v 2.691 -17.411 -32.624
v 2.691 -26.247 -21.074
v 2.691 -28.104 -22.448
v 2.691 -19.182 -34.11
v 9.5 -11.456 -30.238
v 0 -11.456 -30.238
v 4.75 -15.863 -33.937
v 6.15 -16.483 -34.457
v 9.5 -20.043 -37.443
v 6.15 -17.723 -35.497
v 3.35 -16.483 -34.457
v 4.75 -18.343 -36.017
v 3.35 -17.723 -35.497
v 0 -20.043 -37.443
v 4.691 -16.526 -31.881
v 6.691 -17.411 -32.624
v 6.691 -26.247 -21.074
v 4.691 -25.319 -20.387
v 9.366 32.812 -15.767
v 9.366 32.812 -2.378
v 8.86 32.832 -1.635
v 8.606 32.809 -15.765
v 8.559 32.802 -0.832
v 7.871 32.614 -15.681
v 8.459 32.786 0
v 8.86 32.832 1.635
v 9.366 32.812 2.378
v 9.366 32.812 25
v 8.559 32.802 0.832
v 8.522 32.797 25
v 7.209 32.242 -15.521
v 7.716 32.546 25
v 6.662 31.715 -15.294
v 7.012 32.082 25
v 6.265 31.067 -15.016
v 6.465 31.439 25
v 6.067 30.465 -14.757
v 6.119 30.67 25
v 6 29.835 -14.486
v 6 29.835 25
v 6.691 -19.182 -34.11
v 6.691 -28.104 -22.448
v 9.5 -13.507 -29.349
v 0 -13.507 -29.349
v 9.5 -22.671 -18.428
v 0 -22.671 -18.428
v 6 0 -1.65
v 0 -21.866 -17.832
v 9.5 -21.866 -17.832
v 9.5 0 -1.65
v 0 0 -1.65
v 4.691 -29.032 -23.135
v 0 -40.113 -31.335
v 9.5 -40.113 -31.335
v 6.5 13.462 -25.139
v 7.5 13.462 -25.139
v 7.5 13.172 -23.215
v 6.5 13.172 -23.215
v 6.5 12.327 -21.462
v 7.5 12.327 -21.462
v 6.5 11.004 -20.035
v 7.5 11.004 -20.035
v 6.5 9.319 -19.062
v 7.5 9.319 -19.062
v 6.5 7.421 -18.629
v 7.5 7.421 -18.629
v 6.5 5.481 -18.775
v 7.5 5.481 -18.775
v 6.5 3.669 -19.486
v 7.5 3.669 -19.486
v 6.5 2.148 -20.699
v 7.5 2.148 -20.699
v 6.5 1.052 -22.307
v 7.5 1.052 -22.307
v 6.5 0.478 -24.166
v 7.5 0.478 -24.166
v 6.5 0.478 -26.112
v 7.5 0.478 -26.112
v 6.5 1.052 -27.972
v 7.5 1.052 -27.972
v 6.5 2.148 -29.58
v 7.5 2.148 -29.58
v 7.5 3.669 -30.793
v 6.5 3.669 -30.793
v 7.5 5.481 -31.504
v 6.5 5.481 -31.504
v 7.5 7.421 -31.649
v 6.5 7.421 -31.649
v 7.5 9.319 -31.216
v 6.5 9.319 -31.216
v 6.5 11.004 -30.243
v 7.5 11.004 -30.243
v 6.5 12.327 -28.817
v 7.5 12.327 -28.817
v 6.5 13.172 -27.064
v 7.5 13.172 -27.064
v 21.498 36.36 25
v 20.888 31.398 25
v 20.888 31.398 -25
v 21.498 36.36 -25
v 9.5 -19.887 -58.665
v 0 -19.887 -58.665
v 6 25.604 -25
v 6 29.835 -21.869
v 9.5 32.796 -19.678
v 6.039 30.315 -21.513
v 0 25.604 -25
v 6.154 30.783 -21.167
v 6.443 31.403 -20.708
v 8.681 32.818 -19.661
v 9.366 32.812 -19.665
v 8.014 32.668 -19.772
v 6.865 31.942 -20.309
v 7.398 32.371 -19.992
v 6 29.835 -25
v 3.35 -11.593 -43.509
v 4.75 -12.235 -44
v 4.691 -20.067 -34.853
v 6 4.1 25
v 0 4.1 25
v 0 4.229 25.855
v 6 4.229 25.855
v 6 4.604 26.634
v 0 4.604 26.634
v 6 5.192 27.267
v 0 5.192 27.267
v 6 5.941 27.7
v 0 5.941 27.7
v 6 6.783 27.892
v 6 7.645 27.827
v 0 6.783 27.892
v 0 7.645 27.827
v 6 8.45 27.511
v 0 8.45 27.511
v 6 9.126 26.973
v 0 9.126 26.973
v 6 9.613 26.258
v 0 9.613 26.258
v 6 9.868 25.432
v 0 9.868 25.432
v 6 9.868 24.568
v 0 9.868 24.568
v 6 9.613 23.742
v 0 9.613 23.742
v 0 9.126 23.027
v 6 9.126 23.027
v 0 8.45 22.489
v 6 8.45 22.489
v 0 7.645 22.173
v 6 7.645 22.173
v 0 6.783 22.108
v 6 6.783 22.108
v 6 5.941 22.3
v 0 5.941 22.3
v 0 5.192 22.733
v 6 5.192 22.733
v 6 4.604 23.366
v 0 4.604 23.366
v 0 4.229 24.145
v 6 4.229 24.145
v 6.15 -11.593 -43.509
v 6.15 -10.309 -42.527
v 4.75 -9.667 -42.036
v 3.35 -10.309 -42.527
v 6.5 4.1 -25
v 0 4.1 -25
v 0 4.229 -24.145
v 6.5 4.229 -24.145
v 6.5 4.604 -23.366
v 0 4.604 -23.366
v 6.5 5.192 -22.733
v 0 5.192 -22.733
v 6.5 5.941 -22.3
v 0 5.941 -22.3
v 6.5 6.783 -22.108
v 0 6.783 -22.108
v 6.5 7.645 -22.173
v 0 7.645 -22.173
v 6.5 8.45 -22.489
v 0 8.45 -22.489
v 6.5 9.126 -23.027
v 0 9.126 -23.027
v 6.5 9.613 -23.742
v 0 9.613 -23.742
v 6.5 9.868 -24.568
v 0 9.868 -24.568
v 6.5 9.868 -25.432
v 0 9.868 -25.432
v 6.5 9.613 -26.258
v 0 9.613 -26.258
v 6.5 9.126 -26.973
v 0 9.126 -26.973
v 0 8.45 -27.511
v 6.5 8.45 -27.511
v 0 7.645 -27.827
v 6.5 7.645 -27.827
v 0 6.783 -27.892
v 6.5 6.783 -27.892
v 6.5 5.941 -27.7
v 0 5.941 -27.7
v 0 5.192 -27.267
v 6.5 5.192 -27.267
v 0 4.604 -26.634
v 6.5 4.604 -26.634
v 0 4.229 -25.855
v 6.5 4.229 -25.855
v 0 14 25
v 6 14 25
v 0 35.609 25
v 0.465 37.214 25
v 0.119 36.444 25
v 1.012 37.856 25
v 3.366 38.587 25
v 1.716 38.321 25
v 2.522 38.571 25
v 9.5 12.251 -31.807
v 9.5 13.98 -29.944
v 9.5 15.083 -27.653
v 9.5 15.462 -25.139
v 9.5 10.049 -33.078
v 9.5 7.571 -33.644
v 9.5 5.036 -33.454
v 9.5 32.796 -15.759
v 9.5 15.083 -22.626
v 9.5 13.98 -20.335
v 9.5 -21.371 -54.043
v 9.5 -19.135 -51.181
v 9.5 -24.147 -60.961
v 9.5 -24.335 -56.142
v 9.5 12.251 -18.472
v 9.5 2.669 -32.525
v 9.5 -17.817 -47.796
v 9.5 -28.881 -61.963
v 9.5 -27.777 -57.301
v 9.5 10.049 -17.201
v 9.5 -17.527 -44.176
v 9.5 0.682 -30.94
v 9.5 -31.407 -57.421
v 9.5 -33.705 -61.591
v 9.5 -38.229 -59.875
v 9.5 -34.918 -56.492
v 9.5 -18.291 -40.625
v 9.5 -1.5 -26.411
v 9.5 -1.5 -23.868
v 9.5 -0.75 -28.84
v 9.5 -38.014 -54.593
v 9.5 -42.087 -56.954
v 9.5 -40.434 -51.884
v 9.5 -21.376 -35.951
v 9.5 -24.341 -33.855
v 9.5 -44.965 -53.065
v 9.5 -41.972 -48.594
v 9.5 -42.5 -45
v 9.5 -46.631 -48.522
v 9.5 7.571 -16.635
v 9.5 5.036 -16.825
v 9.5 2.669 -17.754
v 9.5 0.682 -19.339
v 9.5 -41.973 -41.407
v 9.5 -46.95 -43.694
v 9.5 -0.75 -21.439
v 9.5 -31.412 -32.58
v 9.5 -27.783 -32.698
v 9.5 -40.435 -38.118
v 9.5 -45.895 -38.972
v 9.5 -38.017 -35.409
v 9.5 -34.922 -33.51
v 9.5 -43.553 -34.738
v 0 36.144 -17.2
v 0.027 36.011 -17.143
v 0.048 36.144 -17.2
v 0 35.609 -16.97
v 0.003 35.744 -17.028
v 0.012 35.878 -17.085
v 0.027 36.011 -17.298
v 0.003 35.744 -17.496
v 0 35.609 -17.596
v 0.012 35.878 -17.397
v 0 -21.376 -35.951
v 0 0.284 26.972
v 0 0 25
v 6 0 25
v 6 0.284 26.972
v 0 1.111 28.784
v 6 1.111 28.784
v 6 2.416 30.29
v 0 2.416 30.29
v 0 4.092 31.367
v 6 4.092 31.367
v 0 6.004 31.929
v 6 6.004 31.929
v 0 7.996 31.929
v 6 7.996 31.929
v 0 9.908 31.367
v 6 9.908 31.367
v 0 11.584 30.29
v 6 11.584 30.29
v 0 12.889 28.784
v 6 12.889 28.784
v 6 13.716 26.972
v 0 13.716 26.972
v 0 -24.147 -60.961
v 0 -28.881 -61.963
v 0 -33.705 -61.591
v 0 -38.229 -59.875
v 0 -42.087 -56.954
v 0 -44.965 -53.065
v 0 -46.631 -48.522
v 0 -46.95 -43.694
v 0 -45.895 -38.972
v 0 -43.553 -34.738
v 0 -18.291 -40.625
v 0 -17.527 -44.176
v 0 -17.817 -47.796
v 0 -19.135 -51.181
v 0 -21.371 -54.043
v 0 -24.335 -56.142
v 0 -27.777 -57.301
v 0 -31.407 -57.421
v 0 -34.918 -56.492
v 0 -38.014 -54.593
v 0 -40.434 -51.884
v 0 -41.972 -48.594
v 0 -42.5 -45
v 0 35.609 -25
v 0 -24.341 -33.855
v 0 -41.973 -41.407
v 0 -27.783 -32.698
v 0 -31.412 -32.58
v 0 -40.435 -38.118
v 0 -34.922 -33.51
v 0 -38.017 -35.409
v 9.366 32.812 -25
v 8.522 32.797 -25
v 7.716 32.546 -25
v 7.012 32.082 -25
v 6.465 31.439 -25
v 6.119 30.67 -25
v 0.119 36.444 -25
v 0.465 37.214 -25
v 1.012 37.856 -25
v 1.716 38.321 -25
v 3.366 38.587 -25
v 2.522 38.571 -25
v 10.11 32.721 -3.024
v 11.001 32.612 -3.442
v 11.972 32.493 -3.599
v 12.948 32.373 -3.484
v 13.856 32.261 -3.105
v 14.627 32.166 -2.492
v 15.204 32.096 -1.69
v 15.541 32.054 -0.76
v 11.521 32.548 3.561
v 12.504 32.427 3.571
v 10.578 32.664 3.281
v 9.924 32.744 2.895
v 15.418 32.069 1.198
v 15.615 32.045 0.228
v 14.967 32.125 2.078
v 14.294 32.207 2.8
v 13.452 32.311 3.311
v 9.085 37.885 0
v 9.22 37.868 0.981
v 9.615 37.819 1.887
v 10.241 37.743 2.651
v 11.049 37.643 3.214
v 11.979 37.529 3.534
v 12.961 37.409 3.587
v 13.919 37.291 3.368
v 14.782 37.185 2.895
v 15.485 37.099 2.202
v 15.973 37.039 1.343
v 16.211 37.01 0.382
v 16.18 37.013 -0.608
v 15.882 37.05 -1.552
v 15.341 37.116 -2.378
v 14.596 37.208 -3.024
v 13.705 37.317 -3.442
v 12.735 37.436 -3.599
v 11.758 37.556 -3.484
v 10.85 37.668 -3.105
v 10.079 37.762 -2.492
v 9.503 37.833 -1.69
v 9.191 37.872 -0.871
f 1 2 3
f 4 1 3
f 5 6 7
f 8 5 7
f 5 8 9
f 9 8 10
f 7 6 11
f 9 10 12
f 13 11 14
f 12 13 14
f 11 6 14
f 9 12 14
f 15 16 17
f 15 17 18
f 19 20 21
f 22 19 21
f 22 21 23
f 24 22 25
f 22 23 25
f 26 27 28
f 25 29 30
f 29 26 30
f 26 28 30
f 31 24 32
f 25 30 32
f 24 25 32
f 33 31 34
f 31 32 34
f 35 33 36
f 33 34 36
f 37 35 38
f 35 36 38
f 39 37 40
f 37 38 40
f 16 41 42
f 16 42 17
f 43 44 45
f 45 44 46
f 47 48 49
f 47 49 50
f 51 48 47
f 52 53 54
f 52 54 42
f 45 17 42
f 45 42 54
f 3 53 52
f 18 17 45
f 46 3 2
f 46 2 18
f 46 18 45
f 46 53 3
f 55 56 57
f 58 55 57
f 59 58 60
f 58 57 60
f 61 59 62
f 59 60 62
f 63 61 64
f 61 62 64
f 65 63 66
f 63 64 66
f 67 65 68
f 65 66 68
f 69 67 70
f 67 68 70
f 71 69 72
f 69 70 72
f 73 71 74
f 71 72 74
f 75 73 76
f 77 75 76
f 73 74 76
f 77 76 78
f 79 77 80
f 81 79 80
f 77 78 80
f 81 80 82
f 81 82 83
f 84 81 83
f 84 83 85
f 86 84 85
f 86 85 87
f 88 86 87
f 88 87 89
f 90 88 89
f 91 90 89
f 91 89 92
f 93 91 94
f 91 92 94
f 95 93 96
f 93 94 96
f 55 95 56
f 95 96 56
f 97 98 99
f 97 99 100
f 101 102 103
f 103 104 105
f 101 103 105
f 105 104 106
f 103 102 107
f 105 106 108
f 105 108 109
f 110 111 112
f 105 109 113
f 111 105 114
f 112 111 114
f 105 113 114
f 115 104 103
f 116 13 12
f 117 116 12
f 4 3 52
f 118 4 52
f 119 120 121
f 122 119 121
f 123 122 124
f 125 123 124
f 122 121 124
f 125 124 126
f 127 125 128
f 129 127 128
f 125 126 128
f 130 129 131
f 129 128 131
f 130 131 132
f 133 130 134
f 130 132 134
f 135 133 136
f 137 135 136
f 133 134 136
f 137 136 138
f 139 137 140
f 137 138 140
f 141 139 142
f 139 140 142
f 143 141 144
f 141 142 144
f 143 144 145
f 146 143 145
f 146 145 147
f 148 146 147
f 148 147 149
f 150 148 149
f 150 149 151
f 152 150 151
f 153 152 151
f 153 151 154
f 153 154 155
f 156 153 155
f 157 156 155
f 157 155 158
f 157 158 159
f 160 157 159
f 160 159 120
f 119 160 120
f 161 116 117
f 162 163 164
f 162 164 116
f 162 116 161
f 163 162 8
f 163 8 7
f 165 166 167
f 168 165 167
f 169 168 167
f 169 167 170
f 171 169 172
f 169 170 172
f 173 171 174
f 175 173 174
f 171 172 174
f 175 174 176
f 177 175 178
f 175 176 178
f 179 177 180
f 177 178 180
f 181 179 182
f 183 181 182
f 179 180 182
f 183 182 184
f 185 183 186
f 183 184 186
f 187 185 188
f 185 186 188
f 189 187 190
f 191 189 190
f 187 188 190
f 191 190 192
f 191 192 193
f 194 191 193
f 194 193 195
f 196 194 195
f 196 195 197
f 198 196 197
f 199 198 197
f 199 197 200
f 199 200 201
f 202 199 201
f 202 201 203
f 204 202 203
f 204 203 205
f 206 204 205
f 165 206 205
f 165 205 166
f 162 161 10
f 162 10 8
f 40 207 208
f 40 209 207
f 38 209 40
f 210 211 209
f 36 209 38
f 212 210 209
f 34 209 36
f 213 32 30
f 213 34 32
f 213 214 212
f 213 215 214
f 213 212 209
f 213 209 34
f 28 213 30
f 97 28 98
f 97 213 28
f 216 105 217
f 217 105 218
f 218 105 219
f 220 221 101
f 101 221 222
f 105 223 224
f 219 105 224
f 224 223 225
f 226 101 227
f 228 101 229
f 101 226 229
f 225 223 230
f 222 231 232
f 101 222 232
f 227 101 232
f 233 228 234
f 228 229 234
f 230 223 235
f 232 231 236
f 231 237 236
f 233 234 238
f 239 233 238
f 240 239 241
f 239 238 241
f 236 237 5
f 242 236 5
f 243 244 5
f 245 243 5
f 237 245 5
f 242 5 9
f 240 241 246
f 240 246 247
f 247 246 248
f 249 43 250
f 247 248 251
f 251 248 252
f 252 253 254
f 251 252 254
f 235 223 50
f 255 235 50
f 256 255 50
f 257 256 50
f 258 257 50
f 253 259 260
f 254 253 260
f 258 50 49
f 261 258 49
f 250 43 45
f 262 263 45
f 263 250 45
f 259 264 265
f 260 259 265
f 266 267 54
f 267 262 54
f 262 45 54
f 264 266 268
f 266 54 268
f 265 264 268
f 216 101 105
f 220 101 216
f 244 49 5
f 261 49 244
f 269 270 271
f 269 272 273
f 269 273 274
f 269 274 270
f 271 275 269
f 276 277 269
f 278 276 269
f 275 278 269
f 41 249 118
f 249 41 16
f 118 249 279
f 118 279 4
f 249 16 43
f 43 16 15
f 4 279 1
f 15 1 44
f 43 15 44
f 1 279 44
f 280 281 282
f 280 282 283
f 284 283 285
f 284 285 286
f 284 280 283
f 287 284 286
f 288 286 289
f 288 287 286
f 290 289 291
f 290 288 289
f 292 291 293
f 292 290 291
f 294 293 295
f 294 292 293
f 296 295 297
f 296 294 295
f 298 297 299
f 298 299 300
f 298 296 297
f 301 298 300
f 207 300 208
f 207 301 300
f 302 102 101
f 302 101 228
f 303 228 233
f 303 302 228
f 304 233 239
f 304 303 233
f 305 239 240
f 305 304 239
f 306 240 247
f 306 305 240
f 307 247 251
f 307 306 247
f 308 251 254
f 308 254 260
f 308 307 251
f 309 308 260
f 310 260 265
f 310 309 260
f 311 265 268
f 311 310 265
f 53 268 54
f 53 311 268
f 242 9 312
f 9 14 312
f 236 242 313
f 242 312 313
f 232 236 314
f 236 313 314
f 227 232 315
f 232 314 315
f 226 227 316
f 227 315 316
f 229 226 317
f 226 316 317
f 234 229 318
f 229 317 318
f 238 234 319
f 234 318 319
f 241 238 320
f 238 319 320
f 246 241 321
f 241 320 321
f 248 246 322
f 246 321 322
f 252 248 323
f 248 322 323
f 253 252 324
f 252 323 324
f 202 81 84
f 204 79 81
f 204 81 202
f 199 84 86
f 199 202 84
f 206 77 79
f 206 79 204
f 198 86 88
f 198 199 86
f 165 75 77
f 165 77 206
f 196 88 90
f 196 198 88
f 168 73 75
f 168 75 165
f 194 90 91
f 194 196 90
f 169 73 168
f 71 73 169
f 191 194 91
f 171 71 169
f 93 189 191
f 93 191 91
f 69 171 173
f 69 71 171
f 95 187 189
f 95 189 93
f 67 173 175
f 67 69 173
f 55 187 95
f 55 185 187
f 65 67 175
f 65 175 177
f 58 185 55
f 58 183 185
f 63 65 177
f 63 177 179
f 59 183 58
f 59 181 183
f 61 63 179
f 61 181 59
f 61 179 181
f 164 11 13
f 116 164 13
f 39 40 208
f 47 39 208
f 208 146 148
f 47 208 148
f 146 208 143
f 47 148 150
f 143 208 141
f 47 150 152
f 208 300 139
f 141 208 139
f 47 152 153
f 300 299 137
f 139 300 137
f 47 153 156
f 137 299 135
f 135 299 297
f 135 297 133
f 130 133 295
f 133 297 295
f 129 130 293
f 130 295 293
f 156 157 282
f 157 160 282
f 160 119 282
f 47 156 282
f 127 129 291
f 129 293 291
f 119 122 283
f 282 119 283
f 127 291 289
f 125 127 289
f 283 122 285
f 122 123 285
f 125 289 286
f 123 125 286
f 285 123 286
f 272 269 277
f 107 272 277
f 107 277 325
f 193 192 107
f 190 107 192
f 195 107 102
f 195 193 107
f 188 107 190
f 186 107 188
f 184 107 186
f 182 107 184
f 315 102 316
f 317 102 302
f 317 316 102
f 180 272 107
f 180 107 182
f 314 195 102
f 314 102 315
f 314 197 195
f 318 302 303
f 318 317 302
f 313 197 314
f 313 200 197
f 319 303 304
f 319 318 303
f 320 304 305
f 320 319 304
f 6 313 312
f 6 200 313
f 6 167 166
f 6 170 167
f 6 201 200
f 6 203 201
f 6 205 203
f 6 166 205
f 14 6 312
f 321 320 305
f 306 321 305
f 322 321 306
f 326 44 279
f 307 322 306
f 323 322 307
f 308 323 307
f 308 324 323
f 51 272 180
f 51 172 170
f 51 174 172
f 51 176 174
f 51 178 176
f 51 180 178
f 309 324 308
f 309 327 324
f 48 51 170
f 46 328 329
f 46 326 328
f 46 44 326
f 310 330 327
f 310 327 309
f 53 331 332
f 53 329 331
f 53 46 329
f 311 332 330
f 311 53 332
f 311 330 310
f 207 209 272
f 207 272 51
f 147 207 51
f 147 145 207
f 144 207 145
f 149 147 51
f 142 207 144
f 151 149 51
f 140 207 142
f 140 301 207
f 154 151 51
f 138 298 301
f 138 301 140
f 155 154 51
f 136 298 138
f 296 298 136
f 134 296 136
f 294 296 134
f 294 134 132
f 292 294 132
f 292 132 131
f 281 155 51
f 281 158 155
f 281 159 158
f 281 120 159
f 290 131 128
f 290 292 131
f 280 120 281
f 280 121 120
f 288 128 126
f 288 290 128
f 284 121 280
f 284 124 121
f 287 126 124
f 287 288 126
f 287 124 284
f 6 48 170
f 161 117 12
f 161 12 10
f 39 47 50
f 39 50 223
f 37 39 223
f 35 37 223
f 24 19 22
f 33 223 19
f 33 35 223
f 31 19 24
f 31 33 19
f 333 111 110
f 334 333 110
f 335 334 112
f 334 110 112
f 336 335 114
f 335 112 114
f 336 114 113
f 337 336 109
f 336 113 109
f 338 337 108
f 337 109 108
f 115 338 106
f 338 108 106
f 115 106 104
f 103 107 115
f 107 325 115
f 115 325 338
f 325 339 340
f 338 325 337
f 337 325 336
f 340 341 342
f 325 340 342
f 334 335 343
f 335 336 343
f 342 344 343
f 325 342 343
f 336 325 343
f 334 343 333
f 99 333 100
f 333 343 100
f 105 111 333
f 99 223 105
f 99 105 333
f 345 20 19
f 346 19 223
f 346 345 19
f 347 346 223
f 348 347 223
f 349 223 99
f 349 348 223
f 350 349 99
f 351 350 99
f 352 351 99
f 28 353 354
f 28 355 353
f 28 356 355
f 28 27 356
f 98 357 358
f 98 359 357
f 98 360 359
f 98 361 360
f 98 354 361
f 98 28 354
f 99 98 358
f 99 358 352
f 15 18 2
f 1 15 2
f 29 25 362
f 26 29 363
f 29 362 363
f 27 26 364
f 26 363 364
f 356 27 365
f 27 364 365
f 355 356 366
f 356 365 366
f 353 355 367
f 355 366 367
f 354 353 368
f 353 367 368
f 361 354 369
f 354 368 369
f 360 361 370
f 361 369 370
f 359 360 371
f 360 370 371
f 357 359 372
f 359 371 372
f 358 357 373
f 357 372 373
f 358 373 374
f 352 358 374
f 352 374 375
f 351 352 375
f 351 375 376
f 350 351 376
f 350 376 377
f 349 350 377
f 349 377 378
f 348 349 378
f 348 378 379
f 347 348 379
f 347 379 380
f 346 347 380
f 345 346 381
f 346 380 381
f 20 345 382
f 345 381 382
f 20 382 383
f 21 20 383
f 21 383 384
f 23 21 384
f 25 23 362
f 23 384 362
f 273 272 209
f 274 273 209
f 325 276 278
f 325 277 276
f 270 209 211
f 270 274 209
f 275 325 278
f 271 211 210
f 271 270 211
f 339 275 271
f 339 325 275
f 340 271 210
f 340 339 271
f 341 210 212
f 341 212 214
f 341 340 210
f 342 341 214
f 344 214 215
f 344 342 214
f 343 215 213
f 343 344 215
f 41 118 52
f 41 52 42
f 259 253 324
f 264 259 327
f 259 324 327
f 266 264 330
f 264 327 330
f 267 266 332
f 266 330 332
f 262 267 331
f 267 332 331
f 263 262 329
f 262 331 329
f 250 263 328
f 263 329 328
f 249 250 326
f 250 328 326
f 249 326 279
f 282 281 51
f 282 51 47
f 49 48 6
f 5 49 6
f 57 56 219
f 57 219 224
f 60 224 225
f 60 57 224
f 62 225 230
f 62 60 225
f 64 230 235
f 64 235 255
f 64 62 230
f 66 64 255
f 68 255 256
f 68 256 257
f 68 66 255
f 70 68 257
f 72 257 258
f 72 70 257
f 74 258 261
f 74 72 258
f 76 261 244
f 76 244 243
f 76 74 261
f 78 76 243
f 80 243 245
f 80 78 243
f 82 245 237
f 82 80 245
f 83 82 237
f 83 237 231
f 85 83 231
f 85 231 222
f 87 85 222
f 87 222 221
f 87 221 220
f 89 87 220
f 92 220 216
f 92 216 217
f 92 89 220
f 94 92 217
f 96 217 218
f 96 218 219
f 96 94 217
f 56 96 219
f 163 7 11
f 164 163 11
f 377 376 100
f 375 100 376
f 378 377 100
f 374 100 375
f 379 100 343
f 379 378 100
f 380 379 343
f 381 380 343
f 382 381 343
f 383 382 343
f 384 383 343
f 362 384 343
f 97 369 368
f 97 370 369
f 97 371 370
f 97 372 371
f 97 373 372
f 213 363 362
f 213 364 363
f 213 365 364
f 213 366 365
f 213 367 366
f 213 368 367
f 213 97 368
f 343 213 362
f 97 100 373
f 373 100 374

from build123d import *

# Parameters (mm, degrees)
PAD_DEPTH       = 25
FILLET_R        = 3
SKETCH009_R     = 7
PAD001_DEPTH    = 6
SKETCH_R        = 12.5
PAD002_DEPTH    = 9.5
POCKET_DEPTH    = 21.498539
SKETCH003_R     = 2.9
POCKET001_DEPTH = 21.498539
POCKET002_DEPTH = 16
POCKET003_DEPTH = 27
SKETCH008_R     = 3.6
POCKET004_DEPTH = 10
SKETCH017_R     = 6.528292
POCKET005_DEPTH = 3
CHAMFER_SIZE    = 2


with BuildPart() as part:
    # Sketch007 → Pad (new body, symmetric)
    with BuildSketch(Plane.XY):
        Polygon((0, 0), (6, 0), (6, 33.225744), (20.888192, 31.397703), (21.497539, 36.360434), (0, 39), align=None)
    extrude(amount=PAD_DEPTH, both=True)

    # Fillet
    fillet_edges = [part.edges().sort_by_distance(p)[0] for p in [
        (0, 39, 0),
        (6, 33.225744, 0),
    ]]
    fillet(fillet_edges, radius=FILLET_R)

    # Sketch009 (on Face7 of Fillet) → Pad001 (join)
    with BuildSketch(Plane(origin=(0, 0, 0), x_dir=(0, -1, 0), z_dir=(-1, 0, 0))):
        with Locations((-7, 25)):
            Circle(SKETCH009_R)
    extrude(amount=-PAD001_DEPTH)

    # Sketch → Pad002 (join)
    with BuildSketch(Plane(origin=(0, 0, 0), x_dir=(0, -1, 0), z_dir=(-1, 0, 0))):
        with BuildLine():
            Line((40.112649, -31.334923), (0, -1.650119))
            Line((0, -1.650119), (-36.144043, -17.199829))
            Line((19.887351, -58.665077), (-36.144043, -17.199829))
            ThreePointArc((19.887351, -58.665077), (43.665077, -55.112649), (40.112649, -31.334923))
        make_face()
        with Locations((30, -45)):
            Circle(SKETCH_R, mode=Mode.SUBTRACT)
    extrude(amount=-PAD002_DEPTH)

    # Sketch013 → Pocket (cut, through all)
    with BuildSketch(Plane(origin=(0, 0, 0), x_dir=(0, -1, 0), z_dir=(-1, 0, 0))):
        Polygon((22.699889, -37.062297), (13.507356, -29.348846), (26.630219, -13.709626), (25.864174, -13.066839), (11.455736, -30.238147), (21.414314, -38.594386), align=None)
    extrude(amount=-POCKET_DEPTH, mode=Mode.SUBTRACT)

    # Sketch003 (on Face19 of Pad002) → Pocket001 (cut, through all)
    with BuildSketch(Plane(origin=(0, 0, 0), x_dir=(0, -1, 0), z_dir=(-1, 0, 0))):
        with Locations((-7, -25)):
            Circle(SKETCH003_R)
        with Locations((-7, 25)):
            Circle(SKETCH003_R)
    extrude(amount=-POCKET001_DEPTH, mode=Mode.SUBTRACT)

    # Sketch015 → Pocket002 (cut)
    with BuildSketch(Plane(origin=(0, 0.311228, -0.406819), x_dir=(1, 0, 0), z_dir=(0, -0.607611, 0.794235))):
        Polygon((4.690891, -37.115485), (6.690891, -35.960785), (6.690891, -33.651383), (4.690891, -32.496683), (2.690891, -33.651383), (2.690891, -35.960785), align=None)
    extrude(amount=-POCKET002_DEPTH, mode=Mode.SUBTRACT)

    # Sketch014 → Pocket003 (cut)
    with BuildSketch(Plane(origin=(0, 0.311228, -0.406819), x_dir=(1, 0, 0), z_dir=(0, -0.607611, 0.794235))):
        Polygon((6.15, -35.644522), (6.15, -34.027942), (4.75, -33.219651), (3.35, -34.027942), (3.35, -35.644522), (4.75, -36.452813), align=None)
    extrude(amount=-POCKET003_DEPTH, mode=Mode.SUBTRACT)

    # Sketch008 (on Face11 of Pocket003) → Pocket004 (cut)
    with BuildSketch(Plane(origin=(4.717477, 38.420767, 0), x_dir=(-0.992546, 0.121869, 0), z_dir=(0.121869, 0.992546, 0))):
        with Locations((-8, 0)):
            Circle(SKETCH008_R)
    extrude(amount=-POCKET004_DEPTH, mode=Mode.SUBTRACT)

    # Sketch017 (on Face7 of Pocket004) → Pocket005 (cut)
    with BuildSketch(Plane.YZ.offset(9.5)):
        with Locations((6.933498, -25.139439)):
            Circle(SKETCH017_R)
    extrude(amount=-POCKET005_DEPTH, mode=Mode.SUBTRACT)

    # Chamfer
    chamfer_edges = [part.edges().sort_by_distance(p)[0] for p in [
        (9.5, 0.405206, -25.139439),
    ]]
    chamfer(chamfer_edges, length=CHAMFER_SIZE)


solid = part.part
